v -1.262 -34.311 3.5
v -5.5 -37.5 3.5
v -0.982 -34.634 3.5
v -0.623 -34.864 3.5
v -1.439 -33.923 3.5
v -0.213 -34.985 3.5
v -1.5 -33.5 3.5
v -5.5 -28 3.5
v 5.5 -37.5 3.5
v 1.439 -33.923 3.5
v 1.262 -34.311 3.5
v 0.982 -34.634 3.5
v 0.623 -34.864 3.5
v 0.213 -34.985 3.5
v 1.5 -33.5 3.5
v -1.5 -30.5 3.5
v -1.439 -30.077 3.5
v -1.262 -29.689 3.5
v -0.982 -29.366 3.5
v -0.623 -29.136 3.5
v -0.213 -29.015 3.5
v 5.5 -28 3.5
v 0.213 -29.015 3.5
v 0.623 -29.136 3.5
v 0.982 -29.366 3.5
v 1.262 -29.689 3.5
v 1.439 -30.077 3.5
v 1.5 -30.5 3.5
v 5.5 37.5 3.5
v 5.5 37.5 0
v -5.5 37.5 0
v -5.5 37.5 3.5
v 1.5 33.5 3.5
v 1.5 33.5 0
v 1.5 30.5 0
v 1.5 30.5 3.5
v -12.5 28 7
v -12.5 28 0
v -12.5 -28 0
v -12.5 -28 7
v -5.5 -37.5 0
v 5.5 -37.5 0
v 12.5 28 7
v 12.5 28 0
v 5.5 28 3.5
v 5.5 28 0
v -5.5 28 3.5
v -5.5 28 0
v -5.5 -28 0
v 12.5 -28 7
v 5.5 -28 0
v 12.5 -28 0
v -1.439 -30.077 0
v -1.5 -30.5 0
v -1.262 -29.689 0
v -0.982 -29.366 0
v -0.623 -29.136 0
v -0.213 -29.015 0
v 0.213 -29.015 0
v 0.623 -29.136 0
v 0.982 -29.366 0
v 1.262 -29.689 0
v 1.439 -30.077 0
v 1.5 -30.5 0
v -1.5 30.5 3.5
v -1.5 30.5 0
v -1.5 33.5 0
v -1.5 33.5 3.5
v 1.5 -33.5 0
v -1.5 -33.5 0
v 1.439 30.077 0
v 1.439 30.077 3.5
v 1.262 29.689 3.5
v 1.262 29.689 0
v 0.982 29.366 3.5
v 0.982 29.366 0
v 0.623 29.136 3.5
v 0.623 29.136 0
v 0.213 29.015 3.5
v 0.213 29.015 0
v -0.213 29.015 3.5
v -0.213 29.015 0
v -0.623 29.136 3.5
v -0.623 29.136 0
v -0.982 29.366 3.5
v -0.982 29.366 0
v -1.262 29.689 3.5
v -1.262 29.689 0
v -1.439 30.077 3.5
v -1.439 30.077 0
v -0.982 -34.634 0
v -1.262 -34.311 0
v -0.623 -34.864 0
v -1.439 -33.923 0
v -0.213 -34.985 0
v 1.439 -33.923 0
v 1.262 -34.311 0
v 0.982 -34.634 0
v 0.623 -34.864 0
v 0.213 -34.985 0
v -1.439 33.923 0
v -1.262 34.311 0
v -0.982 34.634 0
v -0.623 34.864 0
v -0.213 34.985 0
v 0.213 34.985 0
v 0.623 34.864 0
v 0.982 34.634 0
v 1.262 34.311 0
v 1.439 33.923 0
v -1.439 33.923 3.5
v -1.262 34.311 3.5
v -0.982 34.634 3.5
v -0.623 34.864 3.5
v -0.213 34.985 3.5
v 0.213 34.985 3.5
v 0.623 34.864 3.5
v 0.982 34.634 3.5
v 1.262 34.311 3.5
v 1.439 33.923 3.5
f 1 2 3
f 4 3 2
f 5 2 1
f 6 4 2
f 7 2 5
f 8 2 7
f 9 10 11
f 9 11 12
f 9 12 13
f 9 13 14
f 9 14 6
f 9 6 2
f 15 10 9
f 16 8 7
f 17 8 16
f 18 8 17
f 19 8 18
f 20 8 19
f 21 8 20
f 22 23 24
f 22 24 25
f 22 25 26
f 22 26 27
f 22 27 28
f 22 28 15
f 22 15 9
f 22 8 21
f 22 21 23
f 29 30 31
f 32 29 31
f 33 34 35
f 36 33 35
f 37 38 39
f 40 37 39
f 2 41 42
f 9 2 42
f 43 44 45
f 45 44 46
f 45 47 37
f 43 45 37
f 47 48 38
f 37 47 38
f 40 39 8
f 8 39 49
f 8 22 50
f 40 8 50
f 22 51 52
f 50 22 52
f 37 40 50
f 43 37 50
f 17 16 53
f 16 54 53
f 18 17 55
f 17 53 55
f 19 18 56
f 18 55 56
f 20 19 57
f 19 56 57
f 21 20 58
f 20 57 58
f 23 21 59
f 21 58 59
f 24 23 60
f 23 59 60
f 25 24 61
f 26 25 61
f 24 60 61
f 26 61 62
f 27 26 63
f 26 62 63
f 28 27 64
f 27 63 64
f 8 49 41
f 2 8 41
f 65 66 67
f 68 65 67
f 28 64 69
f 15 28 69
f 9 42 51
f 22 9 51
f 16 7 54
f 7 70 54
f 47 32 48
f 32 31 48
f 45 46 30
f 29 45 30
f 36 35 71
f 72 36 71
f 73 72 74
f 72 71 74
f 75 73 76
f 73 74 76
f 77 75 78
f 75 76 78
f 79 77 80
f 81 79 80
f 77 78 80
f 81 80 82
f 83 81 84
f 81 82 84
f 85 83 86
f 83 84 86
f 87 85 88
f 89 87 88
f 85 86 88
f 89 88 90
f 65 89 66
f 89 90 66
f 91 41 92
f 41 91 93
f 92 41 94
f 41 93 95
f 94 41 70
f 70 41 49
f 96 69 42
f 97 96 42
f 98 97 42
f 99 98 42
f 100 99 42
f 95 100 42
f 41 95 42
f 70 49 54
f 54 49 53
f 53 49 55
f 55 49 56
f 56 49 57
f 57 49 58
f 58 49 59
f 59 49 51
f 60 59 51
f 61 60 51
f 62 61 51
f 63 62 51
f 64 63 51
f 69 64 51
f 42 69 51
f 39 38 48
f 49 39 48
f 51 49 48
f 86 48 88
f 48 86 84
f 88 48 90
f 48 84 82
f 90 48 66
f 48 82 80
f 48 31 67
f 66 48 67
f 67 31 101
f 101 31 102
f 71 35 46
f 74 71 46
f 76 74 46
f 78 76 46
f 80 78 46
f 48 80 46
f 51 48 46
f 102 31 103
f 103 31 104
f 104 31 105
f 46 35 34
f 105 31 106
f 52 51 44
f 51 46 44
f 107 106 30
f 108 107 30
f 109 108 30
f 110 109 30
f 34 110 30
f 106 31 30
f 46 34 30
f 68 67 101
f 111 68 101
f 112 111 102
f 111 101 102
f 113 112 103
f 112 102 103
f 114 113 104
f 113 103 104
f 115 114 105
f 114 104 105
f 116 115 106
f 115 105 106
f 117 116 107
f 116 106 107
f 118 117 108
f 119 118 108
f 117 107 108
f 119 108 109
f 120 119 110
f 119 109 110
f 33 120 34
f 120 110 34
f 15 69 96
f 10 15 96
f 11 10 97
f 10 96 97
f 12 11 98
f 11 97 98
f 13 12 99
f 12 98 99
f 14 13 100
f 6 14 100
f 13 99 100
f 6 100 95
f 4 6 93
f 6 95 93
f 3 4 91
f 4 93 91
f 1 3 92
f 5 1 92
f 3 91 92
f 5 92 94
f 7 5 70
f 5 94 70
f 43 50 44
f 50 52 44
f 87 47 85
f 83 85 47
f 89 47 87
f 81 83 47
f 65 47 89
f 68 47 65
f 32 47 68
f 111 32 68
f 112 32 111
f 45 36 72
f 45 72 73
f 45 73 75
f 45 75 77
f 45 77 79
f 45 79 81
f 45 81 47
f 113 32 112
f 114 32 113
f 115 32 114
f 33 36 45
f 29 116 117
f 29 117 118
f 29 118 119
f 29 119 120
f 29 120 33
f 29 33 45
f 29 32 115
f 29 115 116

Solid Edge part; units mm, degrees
sketch "Sketch1" plane through (0, 0, 0) normal (0, 0, 1) x (1, 0, 0)
  line L0 (-12.5, 28) -> (-12.5, -28)
  line L1 (-12.5, -28) -> (12.5, -28)
  line L2 (12.5, -28) -> (12.5, 28)
  line L3 (12.5, 28) -> (-12.5, 28)
extrude "Protrusion1" add sketch "Sketch1" along normal blind 7
sketch "Sketch2" plane through (0, 0, 0) normal (0, 0, 1) x (1, 0, 0)
  line L0 (-12.5, -28) -> (12.5, -28) construction
  line L1 (5.5, -37.5) -> (5.5, 37.5)
  line L2 (-5.5, -37.5) -> (5.5, -37.5)
  line L3 (-5.5, 37.5) -> (-5.5, -37.5)
  line L4 (-1.5, -33.5) -> (-1.5, -30.5)
  line L5 (1.5, -30.5) -> (1.5, -33.5)
  arc A0 (-1.5, -30.5) -> (1.5, -30.5) centre (0, -30.5) cw
  arc A1 (1.5, -33.5) -> (-1.5, -33.5) centre (0, -33.5) cw
  line L6 (-1.5, 30.5) -> (-1.5, 33.5)
  line L7 (1.5, 33.5) -> (1.5, 30.5)
  arc A2 (1.5, 30.5) -> (-1.5, 30.5) centre (0, 30.5) cw
  arc A3 (-1.5, 33.5) -> (1.5, 33.5) centre (0, 33.5) cw
  line L8 (12.5, 28) -> (-12.5, 28) construction
  line L9 (-5.5, 37.5) -> (-5.5, -37.5) construction
  line L10 (5.5, 37.5) -> (-5.5, 37.5)
  line L11 (5.5, -37.5) -> (5.5, 37.5) construction
extrude "ExtrudedProtrusion_2" add sketch "Sketch2" along normal blind 3.5
properties material "Polycarbonate"
